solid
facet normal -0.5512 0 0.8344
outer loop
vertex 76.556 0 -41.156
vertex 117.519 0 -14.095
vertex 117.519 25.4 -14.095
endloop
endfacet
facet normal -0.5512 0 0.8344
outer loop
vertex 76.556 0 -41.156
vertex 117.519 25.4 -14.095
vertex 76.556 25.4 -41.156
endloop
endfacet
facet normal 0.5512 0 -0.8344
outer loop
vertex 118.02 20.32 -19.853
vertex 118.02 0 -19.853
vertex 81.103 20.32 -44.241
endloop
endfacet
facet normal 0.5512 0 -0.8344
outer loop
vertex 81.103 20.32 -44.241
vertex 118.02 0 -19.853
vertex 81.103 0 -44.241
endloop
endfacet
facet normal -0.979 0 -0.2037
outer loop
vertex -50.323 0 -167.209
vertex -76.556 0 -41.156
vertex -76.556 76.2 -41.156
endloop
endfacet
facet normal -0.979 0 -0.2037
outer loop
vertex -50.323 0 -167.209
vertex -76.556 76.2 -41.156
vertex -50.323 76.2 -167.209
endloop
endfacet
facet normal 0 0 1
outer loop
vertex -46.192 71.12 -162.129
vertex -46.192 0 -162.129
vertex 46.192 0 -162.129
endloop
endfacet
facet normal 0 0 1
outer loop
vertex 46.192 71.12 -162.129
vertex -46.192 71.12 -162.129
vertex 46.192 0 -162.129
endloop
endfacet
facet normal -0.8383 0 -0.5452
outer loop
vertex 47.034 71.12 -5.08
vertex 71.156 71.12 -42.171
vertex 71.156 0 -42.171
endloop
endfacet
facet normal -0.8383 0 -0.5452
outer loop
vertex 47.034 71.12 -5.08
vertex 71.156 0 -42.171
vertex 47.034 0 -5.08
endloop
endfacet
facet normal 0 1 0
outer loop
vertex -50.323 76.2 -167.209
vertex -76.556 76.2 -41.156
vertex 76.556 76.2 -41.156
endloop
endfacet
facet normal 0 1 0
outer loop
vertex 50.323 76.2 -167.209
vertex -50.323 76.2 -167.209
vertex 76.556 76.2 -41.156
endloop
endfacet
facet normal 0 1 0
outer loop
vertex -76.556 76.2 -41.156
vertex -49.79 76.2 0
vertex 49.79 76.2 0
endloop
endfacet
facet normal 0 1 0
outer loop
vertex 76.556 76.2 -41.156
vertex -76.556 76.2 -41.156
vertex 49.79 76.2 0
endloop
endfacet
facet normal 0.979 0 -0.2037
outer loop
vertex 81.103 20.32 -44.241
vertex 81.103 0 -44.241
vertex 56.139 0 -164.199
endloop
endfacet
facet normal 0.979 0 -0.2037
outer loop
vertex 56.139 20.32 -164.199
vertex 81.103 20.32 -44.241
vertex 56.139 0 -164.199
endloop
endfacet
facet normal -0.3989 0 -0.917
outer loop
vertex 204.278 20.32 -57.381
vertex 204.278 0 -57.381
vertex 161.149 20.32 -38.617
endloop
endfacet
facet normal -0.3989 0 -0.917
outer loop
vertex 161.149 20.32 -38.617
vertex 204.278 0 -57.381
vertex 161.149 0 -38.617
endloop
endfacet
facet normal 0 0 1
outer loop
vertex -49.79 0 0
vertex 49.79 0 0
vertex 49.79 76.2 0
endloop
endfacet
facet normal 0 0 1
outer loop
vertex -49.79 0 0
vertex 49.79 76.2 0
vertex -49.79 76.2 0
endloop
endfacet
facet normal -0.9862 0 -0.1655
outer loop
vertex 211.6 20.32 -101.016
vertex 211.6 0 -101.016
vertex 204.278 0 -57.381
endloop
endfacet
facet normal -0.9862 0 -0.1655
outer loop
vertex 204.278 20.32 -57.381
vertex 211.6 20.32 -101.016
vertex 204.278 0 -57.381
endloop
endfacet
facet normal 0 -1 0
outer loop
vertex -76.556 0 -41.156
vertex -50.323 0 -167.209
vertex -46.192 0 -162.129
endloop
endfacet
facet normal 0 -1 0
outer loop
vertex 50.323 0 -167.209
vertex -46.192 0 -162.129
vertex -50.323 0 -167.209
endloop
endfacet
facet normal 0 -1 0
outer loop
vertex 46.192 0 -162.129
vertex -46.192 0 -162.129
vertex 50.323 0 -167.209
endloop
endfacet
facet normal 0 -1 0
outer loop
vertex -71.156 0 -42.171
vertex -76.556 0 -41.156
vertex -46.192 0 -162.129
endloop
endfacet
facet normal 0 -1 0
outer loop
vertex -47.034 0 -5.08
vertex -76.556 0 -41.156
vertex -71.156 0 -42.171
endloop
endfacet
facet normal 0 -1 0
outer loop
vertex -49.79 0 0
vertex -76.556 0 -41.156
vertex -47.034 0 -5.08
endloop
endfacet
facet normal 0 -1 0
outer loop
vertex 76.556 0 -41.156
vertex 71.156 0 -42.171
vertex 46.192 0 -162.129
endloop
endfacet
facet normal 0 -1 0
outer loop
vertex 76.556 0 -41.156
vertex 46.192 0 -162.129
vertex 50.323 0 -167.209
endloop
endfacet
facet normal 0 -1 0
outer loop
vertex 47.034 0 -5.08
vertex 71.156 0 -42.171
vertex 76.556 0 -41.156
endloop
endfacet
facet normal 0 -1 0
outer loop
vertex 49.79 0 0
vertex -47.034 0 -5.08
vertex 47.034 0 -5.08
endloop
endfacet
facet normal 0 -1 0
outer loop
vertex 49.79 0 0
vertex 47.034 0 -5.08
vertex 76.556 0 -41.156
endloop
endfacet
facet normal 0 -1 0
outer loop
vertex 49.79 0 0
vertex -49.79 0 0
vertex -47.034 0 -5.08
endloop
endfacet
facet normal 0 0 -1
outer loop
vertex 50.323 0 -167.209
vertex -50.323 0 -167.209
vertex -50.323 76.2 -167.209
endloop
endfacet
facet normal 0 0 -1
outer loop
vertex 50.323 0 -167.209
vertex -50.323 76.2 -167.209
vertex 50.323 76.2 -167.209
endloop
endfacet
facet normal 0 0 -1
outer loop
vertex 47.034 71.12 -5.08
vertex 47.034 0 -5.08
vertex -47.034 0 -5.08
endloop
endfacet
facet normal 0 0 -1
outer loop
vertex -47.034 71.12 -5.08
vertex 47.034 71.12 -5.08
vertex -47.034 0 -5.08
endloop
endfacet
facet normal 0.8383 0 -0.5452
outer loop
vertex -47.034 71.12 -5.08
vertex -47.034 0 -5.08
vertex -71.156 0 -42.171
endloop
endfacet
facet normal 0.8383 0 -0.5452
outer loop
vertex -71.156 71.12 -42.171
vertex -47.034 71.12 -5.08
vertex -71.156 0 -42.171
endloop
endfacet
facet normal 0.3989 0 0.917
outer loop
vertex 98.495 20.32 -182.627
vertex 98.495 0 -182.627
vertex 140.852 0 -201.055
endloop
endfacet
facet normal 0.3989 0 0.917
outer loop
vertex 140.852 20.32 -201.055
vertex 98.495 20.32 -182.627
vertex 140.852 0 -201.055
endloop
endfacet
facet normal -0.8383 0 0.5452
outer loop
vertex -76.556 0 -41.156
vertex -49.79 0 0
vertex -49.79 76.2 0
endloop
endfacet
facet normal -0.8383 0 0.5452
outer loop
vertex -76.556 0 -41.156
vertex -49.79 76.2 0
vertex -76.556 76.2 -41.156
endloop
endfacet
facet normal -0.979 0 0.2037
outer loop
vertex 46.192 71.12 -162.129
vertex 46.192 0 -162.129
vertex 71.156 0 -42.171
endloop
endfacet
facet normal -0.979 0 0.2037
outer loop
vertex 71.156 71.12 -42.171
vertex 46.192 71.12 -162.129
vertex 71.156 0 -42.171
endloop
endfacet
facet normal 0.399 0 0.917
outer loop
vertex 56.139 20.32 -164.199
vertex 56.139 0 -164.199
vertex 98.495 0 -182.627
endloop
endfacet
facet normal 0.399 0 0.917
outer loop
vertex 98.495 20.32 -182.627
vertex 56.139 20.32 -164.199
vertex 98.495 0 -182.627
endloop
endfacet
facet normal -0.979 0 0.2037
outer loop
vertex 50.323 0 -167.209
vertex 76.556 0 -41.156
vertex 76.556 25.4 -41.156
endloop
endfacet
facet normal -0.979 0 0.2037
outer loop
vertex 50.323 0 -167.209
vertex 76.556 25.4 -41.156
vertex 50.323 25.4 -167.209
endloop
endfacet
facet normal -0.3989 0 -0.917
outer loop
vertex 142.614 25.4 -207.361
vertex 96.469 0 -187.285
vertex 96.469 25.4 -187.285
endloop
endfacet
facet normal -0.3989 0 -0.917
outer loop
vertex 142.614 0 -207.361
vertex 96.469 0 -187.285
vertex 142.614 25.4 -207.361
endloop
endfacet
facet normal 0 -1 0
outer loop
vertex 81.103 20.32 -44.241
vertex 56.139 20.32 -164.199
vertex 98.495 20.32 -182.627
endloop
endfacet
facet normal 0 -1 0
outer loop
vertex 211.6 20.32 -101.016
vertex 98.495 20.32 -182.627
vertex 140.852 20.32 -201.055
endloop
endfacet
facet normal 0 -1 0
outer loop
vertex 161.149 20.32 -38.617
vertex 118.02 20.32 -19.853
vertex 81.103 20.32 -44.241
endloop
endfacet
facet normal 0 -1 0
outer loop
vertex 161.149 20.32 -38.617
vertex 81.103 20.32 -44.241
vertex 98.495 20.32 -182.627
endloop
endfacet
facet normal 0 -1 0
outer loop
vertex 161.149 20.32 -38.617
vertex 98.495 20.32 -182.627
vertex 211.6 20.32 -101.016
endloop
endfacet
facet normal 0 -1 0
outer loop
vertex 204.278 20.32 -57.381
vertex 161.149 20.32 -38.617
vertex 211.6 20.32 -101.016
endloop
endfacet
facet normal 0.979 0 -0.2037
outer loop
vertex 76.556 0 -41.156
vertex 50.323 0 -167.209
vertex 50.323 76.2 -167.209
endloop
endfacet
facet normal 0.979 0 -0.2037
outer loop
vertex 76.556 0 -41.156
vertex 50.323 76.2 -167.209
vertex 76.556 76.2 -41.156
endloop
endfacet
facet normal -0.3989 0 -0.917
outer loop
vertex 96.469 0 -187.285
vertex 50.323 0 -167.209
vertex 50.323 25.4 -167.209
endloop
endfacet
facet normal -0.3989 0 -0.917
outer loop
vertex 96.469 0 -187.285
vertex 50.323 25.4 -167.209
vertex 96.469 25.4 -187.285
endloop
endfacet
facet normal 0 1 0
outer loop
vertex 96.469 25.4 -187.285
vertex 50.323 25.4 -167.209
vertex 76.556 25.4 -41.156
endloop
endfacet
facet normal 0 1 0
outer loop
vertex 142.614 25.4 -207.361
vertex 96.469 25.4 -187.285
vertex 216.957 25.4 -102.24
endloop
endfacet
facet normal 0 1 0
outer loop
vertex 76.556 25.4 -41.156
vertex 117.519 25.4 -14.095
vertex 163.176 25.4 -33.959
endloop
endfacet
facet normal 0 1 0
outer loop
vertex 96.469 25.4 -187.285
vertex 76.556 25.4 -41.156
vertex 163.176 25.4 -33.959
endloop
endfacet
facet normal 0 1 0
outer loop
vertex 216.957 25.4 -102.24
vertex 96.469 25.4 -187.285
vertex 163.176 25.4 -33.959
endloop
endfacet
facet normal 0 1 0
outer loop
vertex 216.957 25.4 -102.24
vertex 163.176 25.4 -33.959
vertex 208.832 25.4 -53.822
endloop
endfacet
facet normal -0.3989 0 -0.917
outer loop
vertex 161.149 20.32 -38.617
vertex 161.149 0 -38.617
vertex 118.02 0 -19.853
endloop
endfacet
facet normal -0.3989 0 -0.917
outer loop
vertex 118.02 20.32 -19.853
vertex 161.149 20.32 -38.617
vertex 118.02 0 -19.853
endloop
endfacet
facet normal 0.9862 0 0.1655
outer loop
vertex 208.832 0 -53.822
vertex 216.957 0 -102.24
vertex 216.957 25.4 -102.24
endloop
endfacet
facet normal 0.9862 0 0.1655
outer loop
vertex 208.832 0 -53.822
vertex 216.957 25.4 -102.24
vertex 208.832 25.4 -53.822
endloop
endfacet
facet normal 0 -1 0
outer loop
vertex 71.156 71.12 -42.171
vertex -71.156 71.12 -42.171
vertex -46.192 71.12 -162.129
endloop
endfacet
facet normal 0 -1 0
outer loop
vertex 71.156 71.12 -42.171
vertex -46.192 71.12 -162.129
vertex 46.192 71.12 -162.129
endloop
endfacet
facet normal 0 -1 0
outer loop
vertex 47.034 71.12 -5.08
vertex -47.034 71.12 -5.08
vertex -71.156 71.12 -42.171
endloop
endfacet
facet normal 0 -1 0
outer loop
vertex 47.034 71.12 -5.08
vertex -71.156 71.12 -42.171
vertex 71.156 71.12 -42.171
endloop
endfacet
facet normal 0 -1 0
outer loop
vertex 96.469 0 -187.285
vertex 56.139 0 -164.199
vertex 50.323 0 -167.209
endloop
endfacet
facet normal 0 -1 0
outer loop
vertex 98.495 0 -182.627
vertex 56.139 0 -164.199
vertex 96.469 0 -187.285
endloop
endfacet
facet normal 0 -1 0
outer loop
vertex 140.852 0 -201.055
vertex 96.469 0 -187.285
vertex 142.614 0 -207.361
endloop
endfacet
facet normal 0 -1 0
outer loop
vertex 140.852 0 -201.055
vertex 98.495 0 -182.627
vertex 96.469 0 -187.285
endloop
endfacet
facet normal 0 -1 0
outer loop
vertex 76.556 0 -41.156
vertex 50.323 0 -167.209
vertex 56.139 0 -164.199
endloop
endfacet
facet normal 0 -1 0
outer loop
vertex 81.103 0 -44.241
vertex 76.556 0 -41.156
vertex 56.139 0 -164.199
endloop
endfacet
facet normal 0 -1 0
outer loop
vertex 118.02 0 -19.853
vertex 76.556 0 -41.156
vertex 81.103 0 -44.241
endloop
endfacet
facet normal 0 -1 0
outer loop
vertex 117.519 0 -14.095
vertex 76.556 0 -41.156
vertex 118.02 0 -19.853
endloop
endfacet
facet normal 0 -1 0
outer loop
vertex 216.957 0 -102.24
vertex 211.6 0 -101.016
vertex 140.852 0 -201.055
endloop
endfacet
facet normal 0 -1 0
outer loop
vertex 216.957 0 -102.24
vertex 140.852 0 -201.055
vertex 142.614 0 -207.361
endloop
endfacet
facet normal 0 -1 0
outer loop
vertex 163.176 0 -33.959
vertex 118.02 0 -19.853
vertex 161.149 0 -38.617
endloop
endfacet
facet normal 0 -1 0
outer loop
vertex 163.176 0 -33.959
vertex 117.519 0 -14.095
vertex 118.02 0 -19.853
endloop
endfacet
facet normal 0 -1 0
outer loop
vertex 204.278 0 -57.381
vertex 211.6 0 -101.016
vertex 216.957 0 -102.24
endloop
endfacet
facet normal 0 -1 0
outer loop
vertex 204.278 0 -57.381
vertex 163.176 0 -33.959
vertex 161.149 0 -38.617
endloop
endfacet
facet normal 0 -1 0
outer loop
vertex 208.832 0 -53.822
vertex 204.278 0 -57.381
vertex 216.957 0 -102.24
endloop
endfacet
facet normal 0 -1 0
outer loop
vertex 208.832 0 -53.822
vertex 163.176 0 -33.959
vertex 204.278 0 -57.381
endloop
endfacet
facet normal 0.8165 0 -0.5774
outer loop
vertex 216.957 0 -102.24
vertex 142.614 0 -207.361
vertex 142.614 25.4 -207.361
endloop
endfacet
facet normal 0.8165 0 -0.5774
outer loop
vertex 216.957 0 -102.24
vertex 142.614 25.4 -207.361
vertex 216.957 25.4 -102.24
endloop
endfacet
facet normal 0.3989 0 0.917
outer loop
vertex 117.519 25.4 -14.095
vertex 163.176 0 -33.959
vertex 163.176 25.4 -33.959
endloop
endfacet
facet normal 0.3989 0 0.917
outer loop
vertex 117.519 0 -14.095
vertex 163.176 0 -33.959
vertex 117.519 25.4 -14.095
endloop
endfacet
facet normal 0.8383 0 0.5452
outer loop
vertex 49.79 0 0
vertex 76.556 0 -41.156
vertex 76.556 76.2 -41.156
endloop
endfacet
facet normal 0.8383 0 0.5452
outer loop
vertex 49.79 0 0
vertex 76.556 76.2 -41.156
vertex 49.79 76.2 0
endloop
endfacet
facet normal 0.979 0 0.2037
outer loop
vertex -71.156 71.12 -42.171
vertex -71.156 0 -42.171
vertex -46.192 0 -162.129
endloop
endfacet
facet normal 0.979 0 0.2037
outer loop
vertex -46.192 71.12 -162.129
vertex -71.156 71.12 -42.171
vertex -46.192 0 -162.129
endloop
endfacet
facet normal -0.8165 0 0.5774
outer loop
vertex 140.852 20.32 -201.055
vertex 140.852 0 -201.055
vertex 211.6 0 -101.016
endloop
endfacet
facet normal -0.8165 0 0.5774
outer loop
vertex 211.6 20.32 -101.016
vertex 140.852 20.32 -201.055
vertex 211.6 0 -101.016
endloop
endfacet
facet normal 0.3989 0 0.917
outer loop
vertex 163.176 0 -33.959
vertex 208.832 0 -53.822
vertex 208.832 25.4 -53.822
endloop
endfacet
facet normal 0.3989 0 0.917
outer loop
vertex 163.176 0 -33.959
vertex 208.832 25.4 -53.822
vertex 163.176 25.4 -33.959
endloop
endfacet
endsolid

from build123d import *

# Parameters (mm, degrees)
F1_DEPTH = 76.2
F2_DEPTH = 25.4
F3_T     = -5.08
F4_T     = -5.08


with BuildPart() as f1:
    # F0 (on Front) → F1 (new body)
    with BuildSketch(Plane.XZ):
        Polygon((49.790394, 0), (0, 0), (-49.790394, 0), (-76.556332, -41.156225), (-50.323382, -167.208984), (0, -167.208984), (50.323382, -167.208984), (76.556332, -41.156225), align=None)
    extrude(amount=-F1_DEPTH)

    # F3
    f3_openings = [f1.faces().sort_by_distance(p)[0] for p in [
        (0, 0, -80.748341),
    ]]
    offset(amount=F3_T, openings=f3_openings)


with BuildPart() as f2:
    # F0 (on Front) → F2 (new body)
    with BuildSketch(Plane.XZ):
        Polygon((117.51905, -14.09507), (76.556332, -41.156225), (50.323382, -167.208984), (96.468692, -187.285169), (142.614001, -207.361353), (216.956899, -102.239521), (208.832195, -53.822174), (163.175622, -33.958622), align=None)
    extrude(amount=-F2_DEPTH)

    # F4
    f4_openings = [f2.faces().sort_by_distance(p)[0] for p in [
        (130.9616, 0, -108.002875),
    ]]
    offset(amount=F4_T, openings=f4_openings)


solid = Compound([f1.part, f2.part])
